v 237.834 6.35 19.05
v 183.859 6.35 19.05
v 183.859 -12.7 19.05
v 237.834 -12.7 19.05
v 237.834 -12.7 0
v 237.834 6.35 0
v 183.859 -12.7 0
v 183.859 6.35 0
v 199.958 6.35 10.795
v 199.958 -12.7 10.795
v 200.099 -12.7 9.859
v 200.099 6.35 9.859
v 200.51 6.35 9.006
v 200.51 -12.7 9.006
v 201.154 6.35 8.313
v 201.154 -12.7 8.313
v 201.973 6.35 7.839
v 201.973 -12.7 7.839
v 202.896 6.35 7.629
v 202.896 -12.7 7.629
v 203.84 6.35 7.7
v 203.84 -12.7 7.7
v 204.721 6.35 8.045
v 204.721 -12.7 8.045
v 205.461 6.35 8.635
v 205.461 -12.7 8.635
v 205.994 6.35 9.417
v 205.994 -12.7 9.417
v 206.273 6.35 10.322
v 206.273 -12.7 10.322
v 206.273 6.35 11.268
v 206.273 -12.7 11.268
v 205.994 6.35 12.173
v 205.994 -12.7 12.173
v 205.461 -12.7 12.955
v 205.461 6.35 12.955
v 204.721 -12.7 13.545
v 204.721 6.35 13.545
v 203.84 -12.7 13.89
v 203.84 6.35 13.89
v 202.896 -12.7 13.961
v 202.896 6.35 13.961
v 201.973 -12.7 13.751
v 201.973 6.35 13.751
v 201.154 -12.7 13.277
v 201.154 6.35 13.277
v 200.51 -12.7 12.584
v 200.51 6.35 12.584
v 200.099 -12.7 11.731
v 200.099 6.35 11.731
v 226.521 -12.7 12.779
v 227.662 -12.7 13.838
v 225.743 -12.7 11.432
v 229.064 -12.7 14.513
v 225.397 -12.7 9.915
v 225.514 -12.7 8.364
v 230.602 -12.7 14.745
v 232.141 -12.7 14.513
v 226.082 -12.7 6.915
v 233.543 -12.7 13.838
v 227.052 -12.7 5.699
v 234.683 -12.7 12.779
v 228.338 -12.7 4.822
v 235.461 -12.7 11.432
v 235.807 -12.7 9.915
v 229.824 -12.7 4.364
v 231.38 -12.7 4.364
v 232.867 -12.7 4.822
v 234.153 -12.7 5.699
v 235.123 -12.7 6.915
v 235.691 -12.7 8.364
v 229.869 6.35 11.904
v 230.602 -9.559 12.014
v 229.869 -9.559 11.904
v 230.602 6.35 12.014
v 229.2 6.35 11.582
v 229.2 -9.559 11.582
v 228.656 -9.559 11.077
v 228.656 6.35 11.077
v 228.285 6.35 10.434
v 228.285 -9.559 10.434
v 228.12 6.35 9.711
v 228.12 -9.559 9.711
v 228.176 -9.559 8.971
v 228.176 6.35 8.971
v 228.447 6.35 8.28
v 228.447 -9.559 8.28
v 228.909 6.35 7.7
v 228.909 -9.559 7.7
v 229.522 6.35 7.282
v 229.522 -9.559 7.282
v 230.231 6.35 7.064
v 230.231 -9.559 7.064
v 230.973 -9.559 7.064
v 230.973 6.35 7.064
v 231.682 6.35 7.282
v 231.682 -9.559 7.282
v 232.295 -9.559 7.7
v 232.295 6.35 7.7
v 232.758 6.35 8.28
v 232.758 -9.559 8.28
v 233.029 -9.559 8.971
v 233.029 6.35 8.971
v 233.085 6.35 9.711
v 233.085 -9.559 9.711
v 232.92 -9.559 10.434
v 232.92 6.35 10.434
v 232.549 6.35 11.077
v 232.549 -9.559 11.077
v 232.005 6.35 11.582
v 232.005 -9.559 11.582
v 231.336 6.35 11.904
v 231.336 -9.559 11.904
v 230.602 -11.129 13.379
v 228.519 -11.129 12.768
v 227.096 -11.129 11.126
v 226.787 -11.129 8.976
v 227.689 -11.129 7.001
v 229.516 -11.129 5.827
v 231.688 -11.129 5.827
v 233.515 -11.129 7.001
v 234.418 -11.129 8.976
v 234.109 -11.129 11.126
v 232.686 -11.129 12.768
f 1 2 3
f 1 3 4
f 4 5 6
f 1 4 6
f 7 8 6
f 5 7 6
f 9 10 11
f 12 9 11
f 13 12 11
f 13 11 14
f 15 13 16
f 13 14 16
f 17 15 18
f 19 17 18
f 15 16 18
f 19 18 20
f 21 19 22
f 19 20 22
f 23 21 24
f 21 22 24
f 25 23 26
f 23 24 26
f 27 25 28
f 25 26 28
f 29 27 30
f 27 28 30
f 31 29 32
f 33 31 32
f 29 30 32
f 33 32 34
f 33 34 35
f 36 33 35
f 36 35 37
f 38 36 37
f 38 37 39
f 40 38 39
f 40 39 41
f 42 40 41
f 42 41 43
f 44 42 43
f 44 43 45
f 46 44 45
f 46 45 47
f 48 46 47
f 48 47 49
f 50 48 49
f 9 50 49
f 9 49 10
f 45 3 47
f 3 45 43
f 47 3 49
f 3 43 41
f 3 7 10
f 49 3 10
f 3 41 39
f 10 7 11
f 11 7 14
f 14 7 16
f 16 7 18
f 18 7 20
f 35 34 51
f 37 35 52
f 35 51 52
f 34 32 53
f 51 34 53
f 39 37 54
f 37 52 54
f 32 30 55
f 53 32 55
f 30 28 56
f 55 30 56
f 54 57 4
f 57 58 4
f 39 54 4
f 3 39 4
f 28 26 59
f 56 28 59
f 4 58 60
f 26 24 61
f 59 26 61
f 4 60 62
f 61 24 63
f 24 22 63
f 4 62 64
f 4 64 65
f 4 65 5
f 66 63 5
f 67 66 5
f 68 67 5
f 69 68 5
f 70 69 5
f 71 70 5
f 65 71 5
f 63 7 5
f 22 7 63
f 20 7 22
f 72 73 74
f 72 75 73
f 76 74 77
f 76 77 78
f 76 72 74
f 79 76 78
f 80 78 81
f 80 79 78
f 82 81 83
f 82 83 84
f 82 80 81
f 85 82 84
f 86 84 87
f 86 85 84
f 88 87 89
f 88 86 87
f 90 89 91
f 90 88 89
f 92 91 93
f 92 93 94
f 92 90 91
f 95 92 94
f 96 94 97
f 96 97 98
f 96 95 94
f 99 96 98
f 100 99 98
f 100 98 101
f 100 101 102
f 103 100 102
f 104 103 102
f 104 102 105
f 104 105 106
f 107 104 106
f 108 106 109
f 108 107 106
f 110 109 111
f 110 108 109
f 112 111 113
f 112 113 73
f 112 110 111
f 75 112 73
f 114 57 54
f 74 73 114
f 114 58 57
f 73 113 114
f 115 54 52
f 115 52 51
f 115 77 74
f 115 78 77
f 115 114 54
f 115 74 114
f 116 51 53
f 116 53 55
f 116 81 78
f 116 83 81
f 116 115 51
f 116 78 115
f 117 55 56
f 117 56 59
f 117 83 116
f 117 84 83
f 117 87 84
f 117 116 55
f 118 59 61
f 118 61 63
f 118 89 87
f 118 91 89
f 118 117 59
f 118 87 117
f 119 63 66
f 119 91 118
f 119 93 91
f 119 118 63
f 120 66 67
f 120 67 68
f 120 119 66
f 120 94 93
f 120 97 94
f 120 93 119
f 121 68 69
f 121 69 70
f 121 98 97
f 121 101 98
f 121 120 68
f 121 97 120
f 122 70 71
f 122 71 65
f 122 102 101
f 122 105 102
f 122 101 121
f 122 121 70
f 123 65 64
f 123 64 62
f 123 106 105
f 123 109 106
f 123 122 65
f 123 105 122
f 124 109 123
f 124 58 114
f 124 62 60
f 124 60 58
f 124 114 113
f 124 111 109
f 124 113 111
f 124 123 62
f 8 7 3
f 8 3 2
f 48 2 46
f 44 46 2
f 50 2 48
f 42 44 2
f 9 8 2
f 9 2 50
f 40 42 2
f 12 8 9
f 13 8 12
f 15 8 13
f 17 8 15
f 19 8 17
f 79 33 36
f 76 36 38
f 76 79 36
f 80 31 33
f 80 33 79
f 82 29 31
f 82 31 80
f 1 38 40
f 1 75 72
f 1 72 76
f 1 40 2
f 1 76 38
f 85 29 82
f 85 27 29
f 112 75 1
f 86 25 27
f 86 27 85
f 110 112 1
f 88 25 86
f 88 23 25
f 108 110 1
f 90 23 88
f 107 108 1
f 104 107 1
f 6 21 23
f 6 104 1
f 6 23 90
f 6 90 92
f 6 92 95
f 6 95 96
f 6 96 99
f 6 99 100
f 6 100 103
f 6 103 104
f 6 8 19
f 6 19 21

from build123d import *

# Parameters (mm, degrees)
SKETCH2_W                   = 53.975
SKETCH2_H                   = 19.05
BOSS_EXTRUDE1_DEPTH         = 19.05
F_1_4_0_25_DIAMETER_HOLE1_D = 6.35


with BuildPart() as part:
    # Sketch2 → Boss-Extrude1 (new body)
    with BuildSketch(Plane.XY):
        with Locations((210.84694204, -3.175)):
            Rectangle(SKETCH2_W, SKETCH2_H)
    extrude(amount=BOSS_EXTRUDE1_DEPTH)

    # 1/4 (0.25) Diameter Hole1 (through all)
    with Locations(Plane(origin=(0, 6.35, 0), x_dir=(1, 0, 0), z_dir=(0, 1, 0))):
        with Locations((203.133359856, -10.795)):
            Hole(F_1_4_0_25_DIAMETER_HOLE1_D / 2)

    # Sketch10 → #10 Clearance Hole1 (revolve, cut)
    with BuildSketch(Plane(origin=(230.602380141, 6.35, 9.525), x_dir=(0, 0, 1), z_dir=(1, 0, 0))):
        Polygon((0, 0), (0, 19.05), (5.2197, 19.05), (2.4892, 15.908919064), (2.4892, 0), align=None)
    revolve(axis=Axis((230.602380141, 12.7, 9.525), (0, -1, 0)), mode=Mode.SUBTRACT)


solid = part.part
